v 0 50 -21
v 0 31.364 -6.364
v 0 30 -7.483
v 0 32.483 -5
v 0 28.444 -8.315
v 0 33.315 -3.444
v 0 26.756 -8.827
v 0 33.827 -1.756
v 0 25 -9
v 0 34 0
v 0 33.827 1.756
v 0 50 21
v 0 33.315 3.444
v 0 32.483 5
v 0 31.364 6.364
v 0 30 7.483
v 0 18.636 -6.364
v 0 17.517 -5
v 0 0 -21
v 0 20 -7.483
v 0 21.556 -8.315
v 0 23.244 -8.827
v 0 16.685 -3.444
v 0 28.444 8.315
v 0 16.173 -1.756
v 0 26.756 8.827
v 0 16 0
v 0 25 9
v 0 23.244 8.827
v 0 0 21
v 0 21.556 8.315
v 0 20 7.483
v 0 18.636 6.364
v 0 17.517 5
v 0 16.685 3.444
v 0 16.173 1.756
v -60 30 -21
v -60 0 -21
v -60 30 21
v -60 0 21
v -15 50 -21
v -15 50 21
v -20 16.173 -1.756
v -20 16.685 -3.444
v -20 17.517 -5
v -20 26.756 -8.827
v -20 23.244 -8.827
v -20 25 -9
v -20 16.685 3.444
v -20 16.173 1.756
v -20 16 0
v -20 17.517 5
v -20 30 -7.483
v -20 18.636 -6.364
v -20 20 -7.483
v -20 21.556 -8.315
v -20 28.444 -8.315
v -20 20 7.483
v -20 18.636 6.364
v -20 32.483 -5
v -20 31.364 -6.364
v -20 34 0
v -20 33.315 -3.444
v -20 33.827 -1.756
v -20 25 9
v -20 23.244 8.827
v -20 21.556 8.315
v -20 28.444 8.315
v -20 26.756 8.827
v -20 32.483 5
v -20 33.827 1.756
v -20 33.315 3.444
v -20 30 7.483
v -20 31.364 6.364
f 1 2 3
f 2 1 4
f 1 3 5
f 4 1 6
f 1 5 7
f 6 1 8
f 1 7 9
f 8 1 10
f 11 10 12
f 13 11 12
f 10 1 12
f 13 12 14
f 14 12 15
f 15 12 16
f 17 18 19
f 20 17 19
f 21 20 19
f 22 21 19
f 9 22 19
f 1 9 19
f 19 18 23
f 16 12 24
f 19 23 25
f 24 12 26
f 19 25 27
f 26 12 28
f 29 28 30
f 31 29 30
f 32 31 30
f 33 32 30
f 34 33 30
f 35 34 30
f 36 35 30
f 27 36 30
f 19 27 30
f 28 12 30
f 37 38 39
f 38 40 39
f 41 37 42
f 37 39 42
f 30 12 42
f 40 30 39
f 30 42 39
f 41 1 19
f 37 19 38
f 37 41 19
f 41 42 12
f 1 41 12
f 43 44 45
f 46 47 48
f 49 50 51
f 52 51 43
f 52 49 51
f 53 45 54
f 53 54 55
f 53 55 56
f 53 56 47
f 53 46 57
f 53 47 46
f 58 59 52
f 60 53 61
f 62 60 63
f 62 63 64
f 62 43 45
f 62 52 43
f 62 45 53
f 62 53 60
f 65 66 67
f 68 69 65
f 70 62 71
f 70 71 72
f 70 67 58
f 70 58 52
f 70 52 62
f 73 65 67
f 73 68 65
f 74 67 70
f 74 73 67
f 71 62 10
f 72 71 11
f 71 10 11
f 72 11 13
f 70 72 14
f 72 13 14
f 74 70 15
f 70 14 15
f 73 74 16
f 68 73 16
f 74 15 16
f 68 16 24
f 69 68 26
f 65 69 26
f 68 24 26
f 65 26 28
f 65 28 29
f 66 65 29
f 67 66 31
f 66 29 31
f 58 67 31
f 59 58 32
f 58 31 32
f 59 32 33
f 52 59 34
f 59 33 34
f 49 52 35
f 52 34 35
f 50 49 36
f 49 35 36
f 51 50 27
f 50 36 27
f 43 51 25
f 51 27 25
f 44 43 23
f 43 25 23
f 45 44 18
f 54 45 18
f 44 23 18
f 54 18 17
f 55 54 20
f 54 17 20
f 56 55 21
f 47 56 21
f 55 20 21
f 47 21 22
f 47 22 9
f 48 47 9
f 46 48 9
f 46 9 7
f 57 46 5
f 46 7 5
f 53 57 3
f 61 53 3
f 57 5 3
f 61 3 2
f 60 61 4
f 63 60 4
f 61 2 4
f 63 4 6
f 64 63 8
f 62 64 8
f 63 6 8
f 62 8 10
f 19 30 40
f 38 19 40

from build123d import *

# Parameters (mm, degrees)
BOSS_EXTRUDE1_DEPTH = 21
SKETCH2_R           = 9
CUT_EXTRUDE1_DEPTH  = 20


with BuildPart() as part:
    # Sketch1 → Boss-Extrude1 (new, symmetric)
    with BuildSketch(Plane.XY):
        Polygon((0, 0), (-60, 0), (-60, 30), (-15, 50), (0, 50), align=None)
    extrude(amount=BOSS_EXTRUDE1_DEPTH, both=True)

    # Sketch2 → Cut-Extrude1 (cut, symmetric)
    with BuildSketch(Plane(origin=(0, 0, 0), x_dir=(0, 0, -1), z_dir=(1, 0, 0))):
        with Locations(Location((0, 25, 0), (0, 0, 90))):
            Circle(SKETCH2_R)
    extrude(amount=CUT_EXTRUDE1_DEPTH, both=True, mode=Mode.SUBTRACT)


solid = part.part
